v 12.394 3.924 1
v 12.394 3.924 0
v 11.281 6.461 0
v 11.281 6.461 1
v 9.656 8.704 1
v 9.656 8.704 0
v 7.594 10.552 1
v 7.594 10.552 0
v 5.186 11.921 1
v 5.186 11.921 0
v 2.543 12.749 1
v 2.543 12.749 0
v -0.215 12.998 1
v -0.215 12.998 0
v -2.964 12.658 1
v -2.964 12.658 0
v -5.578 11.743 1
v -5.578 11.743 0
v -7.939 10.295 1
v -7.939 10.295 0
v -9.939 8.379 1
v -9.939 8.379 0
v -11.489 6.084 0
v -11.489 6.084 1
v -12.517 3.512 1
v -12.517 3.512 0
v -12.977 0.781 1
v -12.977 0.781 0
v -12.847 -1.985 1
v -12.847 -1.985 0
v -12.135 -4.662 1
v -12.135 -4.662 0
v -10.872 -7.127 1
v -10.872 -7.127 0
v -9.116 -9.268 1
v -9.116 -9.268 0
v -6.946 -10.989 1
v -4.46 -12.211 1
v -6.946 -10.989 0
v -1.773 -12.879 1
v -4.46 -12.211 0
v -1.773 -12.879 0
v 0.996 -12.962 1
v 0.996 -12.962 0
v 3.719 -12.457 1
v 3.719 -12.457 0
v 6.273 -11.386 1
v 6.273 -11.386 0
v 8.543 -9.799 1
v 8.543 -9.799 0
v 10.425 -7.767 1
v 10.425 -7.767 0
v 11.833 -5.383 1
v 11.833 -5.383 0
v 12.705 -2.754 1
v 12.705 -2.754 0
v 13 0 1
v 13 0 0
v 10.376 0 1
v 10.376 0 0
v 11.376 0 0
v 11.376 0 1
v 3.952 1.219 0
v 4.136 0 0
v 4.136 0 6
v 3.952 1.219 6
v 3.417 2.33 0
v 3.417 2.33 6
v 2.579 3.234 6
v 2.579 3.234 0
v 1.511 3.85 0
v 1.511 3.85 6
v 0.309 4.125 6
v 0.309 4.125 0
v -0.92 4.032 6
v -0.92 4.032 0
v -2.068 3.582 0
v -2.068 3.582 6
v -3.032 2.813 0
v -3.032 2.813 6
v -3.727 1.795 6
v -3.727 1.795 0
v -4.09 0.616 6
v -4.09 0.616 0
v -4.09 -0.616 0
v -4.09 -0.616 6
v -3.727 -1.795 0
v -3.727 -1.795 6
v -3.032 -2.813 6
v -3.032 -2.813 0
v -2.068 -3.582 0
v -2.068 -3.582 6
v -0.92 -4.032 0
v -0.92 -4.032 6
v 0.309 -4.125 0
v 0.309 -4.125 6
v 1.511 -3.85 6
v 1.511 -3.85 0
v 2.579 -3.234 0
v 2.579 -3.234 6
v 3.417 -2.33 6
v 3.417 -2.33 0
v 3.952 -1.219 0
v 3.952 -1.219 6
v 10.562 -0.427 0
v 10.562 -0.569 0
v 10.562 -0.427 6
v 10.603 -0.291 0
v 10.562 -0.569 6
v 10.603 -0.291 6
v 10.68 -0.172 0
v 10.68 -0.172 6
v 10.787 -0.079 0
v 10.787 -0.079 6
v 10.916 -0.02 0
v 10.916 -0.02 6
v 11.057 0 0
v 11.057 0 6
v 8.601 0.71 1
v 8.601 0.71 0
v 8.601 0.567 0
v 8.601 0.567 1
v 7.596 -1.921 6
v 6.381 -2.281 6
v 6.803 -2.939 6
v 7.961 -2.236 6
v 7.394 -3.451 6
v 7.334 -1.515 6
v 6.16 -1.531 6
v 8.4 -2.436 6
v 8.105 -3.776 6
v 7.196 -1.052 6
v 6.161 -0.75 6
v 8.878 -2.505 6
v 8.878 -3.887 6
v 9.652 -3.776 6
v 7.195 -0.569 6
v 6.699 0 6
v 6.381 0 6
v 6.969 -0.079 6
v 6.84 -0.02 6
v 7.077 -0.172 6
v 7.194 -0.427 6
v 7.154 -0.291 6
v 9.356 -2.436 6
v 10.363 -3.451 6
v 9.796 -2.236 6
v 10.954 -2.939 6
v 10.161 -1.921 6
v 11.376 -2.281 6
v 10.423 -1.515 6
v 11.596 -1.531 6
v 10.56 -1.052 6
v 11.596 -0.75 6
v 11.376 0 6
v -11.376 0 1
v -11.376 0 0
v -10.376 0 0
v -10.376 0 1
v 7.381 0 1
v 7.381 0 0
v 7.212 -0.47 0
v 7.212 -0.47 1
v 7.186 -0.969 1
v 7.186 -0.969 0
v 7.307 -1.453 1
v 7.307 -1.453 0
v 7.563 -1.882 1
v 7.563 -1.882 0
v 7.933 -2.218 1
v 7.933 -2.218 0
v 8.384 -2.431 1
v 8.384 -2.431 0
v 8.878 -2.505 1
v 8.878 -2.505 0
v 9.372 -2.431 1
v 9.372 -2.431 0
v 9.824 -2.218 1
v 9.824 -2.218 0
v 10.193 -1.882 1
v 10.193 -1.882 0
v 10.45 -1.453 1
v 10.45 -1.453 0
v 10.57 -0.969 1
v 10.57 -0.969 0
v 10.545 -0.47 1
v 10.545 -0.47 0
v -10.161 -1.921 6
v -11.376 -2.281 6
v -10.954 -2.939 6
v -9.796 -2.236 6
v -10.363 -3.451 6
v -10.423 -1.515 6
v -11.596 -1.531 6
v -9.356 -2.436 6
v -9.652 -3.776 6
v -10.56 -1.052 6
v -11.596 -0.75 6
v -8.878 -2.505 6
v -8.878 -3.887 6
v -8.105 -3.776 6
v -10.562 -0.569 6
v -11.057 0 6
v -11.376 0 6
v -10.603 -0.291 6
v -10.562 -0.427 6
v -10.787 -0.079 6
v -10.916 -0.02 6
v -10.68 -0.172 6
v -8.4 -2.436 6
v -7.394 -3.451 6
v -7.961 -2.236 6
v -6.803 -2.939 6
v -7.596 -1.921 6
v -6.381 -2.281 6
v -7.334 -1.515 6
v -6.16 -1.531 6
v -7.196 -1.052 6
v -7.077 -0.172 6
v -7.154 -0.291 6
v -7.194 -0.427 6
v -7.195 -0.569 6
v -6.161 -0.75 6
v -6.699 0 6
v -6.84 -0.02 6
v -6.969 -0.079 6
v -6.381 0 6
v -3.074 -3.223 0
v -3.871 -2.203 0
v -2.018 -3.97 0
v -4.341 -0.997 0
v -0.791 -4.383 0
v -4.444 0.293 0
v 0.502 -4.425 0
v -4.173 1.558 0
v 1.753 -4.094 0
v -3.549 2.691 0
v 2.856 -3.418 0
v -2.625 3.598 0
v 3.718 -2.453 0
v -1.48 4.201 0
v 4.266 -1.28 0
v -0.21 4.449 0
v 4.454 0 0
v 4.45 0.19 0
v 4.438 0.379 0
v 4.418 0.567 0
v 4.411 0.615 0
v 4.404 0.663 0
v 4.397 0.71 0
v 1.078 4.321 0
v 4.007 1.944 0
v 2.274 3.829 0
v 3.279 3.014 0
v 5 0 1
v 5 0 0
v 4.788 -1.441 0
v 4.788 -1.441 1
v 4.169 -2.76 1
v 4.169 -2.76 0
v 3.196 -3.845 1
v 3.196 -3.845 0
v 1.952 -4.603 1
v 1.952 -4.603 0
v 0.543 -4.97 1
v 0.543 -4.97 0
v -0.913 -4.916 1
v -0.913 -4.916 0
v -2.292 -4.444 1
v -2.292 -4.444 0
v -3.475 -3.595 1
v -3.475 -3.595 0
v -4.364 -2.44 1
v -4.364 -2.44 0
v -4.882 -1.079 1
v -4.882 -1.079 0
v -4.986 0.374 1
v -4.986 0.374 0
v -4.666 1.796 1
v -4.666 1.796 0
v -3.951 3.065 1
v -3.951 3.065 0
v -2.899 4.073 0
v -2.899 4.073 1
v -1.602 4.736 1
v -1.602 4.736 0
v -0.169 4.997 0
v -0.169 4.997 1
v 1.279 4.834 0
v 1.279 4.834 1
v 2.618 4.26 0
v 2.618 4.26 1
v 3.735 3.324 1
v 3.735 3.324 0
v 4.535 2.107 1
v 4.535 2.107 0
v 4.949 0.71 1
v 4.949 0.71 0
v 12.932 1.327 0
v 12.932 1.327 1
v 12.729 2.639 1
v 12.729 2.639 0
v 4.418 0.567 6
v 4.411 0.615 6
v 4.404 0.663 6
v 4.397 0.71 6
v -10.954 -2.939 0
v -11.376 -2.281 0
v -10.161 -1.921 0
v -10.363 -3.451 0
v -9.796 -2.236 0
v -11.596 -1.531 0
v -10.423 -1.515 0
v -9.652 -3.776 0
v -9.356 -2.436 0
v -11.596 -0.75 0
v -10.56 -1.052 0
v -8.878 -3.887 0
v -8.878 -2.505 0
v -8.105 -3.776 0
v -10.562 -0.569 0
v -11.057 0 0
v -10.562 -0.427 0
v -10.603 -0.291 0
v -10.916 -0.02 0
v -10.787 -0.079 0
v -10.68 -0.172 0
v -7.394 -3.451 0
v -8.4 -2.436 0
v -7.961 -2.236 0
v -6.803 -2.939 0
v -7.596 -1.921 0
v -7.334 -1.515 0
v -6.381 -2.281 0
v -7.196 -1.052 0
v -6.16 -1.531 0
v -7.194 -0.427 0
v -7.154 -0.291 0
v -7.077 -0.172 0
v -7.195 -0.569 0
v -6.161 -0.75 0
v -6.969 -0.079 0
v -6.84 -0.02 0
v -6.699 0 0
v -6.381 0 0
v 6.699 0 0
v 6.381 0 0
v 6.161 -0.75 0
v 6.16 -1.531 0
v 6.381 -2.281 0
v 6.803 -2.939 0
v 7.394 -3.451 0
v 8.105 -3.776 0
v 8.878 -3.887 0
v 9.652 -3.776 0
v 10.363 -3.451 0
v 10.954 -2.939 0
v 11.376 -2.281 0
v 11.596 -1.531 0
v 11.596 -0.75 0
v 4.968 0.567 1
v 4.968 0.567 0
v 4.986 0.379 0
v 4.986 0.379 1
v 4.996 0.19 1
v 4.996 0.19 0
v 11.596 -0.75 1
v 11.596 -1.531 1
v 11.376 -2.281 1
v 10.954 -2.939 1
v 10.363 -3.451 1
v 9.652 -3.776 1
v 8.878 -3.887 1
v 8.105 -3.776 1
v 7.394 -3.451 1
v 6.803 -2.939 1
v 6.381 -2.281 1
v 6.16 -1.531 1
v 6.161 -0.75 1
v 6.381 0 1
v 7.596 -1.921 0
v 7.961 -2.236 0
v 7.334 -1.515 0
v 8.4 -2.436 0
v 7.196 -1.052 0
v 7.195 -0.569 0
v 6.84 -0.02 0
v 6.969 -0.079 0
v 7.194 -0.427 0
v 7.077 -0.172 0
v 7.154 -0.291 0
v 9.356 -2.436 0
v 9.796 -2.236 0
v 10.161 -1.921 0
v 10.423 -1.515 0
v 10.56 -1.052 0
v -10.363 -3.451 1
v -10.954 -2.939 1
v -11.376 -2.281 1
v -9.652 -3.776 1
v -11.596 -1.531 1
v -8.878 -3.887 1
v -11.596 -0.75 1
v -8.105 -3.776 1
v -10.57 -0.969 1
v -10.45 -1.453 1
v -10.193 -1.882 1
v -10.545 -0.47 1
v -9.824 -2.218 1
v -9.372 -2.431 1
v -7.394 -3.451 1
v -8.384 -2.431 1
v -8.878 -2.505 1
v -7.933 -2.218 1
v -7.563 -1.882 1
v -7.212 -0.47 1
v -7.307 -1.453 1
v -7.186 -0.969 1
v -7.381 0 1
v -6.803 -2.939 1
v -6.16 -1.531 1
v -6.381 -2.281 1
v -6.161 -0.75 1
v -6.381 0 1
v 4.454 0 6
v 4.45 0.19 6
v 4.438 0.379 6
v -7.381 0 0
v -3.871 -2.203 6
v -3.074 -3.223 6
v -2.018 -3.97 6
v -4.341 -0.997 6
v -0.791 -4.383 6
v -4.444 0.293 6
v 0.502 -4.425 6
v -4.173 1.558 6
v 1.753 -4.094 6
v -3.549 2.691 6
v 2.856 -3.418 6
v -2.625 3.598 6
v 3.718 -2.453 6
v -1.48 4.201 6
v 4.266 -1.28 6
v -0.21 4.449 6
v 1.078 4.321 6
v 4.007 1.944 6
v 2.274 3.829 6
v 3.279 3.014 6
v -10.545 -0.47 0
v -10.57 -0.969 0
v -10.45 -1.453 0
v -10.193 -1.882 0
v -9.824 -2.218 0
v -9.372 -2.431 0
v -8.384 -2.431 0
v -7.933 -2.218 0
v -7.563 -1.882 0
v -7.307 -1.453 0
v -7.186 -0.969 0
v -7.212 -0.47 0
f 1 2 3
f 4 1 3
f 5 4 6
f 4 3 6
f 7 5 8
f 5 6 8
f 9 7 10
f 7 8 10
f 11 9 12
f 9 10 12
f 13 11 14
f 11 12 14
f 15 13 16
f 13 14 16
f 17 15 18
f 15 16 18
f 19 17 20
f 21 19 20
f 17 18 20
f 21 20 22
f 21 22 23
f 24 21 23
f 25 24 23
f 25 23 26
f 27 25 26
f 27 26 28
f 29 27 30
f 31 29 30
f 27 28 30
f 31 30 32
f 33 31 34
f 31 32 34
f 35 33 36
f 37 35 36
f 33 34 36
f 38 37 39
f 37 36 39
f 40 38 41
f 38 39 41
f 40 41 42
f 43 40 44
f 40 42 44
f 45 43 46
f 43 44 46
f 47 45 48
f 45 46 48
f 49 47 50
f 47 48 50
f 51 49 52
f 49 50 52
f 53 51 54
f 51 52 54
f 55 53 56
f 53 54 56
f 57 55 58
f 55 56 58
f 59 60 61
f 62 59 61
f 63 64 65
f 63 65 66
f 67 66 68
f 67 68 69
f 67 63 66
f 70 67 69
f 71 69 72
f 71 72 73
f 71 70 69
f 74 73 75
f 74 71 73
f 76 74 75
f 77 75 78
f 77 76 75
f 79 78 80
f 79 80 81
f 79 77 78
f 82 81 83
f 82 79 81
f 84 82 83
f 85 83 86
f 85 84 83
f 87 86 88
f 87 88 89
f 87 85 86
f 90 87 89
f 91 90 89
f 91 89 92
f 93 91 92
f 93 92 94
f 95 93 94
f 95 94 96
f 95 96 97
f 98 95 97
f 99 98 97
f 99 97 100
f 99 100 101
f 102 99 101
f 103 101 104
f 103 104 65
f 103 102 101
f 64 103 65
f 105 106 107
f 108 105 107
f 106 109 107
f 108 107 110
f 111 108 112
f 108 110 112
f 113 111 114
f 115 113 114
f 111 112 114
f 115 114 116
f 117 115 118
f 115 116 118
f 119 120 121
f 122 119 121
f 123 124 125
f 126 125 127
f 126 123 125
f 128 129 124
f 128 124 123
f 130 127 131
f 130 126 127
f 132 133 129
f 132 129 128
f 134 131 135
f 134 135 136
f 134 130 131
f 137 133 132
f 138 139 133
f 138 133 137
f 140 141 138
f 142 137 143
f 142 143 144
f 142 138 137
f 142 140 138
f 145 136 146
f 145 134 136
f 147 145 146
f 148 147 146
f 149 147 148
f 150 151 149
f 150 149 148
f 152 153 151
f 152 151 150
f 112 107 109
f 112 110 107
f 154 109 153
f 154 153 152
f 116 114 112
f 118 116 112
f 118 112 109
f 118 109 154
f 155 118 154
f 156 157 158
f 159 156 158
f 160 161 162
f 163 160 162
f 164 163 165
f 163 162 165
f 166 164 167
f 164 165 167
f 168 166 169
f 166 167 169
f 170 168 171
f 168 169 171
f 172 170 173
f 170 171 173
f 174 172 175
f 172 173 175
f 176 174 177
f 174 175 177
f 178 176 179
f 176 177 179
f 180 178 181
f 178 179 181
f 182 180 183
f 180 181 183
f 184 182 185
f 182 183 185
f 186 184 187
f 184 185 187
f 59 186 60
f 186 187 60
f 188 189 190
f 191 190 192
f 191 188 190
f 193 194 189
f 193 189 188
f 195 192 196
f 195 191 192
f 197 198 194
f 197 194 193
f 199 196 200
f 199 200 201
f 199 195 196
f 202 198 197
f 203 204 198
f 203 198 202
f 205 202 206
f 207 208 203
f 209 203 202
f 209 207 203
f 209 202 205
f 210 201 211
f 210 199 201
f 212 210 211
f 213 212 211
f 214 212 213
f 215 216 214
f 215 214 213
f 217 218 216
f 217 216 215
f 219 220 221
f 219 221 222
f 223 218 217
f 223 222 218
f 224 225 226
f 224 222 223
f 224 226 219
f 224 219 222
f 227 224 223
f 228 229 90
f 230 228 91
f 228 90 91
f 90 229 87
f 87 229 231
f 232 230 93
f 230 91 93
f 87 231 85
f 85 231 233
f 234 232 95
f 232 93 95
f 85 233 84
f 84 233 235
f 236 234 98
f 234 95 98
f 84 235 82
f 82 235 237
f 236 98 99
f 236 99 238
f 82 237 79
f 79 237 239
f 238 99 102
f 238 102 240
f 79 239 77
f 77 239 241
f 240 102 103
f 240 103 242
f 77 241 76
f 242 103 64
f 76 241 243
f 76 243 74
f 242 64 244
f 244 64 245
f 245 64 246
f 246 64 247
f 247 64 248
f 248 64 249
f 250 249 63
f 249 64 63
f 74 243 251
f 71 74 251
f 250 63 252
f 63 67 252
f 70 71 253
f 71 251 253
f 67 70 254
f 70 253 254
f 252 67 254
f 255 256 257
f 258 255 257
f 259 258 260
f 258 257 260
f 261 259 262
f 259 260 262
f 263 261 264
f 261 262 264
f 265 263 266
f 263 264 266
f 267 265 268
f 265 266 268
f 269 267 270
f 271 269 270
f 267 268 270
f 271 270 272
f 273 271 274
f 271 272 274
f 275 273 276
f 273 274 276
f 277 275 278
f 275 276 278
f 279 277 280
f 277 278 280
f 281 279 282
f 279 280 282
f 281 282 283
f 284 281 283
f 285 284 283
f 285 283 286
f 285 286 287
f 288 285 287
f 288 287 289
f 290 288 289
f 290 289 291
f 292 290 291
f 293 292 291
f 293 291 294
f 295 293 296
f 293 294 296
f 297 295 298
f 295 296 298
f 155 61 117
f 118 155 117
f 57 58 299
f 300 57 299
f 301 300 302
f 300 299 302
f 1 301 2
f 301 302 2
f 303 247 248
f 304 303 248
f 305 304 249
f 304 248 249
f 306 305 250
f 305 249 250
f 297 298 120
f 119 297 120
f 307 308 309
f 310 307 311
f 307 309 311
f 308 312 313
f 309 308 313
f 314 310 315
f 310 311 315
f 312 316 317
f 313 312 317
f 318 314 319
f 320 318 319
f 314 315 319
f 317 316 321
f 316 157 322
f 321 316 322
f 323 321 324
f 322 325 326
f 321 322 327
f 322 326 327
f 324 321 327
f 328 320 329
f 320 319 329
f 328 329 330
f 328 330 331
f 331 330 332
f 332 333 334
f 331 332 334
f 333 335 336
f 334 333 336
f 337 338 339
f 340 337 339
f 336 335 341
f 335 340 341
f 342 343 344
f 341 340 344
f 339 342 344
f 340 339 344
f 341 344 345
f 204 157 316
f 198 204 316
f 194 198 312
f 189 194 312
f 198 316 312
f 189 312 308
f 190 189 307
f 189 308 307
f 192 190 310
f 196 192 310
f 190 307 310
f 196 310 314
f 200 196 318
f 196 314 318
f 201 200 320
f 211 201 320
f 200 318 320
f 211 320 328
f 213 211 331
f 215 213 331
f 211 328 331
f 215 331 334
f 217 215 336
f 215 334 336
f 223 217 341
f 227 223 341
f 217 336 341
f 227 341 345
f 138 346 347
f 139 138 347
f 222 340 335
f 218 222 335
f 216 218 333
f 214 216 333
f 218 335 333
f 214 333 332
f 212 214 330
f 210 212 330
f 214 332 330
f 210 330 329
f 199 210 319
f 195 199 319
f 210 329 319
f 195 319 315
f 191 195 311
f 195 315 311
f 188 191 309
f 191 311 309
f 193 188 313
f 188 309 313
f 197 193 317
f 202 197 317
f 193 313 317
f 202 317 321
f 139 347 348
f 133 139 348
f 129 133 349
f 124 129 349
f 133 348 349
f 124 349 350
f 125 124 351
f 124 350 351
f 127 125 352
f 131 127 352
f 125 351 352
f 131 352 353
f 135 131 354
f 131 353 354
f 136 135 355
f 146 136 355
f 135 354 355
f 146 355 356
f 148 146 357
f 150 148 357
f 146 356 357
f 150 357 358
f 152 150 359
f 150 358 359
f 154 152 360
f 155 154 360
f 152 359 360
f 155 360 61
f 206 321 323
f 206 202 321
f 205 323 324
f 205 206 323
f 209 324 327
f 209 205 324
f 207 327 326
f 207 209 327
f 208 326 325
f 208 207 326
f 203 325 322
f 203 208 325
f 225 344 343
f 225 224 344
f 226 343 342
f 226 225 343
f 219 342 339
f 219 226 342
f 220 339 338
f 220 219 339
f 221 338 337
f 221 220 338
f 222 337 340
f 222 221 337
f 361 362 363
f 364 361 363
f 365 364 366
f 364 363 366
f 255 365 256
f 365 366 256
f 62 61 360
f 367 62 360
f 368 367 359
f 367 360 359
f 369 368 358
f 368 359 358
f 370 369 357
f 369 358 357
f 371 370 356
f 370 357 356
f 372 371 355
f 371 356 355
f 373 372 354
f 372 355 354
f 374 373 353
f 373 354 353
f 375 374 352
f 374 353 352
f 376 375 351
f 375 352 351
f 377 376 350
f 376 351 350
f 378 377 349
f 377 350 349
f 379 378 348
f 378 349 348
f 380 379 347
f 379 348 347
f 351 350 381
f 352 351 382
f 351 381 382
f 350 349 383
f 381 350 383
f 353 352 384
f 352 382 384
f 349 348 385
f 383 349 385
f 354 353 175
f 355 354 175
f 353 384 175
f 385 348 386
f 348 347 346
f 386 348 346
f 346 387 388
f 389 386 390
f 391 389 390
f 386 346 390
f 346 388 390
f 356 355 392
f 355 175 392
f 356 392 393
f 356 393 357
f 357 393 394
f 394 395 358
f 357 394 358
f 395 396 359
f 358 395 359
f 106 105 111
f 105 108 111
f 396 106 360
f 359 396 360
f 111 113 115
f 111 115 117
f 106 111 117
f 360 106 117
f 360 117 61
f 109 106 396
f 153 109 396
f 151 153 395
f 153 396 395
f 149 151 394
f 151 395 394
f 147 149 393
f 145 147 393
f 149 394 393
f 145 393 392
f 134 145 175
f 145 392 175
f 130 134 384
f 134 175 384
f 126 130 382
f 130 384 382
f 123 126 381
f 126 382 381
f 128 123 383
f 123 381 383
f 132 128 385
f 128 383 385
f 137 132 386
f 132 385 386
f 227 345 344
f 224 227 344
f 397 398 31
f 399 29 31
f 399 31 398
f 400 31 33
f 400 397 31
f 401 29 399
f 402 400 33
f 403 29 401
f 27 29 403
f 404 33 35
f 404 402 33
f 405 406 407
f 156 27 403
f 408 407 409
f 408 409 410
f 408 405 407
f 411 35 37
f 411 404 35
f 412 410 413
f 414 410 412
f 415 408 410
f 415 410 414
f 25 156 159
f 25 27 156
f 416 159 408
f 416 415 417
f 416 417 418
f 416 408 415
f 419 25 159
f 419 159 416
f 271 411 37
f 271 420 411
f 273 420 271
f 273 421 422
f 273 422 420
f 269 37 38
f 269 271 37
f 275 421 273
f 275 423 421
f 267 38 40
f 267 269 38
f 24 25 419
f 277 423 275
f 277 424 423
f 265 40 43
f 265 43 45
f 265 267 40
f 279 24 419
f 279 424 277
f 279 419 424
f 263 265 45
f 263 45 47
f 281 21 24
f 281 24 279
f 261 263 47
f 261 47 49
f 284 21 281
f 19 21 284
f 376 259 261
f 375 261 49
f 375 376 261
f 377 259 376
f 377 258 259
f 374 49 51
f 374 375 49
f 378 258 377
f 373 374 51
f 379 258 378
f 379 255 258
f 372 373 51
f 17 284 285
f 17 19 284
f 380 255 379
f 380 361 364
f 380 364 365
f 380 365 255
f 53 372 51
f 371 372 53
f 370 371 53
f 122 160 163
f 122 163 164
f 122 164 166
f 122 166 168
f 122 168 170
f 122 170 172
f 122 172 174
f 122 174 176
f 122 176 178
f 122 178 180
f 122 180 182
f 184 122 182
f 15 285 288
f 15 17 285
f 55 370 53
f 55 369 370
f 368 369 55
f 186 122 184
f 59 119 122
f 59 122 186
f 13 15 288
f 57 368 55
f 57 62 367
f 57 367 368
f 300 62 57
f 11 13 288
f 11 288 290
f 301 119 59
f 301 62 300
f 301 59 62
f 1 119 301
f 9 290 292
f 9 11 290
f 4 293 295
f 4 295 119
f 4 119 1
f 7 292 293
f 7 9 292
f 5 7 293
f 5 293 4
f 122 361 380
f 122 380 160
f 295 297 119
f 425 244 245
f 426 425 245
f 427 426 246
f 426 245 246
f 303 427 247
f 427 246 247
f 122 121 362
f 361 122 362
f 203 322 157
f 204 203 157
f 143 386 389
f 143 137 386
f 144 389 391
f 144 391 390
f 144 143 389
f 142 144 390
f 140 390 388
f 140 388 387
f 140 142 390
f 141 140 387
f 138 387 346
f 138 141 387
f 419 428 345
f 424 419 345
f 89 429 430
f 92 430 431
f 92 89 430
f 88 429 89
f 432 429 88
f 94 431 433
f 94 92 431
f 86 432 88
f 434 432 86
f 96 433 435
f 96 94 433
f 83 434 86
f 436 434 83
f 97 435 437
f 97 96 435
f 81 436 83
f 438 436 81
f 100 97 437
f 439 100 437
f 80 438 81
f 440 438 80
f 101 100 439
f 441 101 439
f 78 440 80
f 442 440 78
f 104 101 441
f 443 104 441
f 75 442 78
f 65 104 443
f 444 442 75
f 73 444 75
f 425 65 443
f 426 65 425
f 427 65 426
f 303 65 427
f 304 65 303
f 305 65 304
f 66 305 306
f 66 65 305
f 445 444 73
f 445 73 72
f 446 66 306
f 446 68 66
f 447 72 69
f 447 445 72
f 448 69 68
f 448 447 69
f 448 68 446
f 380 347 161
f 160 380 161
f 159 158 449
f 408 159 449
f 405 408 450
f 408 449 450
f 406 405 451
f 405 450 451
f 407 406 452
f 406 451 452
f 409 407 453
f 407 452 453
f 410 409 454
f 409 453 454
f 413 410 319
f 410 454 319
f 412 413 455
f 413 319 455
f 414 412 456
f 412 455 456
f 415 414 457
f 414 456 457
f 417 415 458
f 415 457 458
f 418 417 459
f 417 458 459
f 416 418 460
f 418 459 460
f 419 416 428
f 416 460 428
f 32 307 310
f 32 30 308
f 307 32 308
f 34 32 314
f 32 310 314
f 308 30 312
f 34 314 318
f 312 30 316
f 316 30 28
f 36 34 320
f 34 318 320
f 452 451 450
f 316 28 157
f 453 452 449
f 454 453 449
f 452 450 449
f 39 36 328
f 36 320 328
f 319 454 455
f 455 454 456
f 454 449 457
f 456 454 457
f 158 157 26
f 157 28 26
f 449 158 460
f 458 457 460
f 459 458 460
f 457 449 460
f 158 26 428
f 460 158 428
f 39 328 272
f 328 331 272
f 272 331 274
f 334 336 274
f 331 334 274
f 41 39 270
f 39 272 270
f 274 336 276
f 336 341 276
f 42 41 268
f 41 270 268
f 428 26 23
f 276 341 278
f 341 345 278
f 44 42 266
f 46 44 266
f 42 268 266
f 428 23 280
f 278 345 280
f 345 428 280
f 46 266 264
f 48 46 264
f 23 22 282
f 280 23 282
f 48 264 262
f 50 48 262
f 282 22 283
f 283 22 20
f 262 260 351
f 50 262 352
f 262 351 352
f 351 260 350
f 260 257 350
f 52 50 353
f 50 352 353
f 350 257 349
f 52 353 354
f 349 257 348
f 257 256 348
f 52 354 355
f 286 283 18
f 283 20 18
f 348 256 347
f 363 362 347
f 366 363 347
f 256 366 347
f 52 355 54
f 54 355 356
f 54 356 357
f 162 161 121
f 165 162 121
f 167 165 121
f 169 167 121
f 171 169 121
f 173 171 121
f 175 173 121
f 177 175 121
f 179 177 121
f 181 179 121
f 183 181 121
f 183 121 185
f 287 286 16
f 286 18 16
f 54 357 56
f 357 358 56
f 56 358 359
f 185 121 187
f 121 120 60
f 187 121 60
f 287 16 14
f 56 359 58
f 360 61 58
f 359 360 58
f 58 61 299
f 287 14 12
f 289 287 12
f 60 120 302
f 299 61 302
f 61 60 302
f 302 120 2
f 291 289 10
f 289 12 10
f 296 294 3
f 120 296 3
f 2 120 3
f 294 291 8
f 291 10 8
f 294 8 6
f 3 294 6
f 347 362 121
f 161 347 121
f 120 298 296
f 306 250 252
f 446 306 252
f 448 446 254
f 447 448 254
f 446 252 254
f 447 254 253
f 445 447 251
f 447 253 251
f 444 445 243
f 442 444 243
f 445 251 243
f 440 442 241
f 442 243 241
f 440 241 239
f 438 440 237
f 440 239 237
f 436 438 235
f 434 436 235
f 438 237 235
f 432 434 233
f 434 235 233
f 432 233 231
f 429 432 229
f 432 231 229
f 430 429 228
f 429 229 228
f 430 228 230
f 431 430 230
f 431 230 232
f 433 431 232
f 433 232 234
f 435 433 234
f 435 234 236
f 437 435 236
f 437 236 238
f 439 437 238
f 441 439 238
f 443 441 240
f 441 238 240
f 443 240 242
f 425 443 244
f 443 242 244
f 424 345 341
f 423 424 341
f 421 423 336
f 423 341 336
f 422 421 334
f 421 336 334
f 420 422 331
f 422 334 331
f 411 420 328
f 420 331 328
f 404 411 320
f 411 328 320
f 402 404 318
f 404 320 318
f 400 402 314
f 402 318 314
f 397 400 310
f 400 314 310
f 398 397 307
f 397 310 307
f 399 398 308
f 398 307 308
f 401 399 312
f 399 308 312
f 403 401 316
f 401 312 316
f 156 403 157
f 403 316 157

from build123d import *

# Parameters (mm, degrees)
F1_DEPTH = 6
F2_DEPTH = 1
F0_R     = 4.136169
F3_DEPTH = 6
F4_R     = 0.5


with BuildPart() as f1:
    # F0 (on Top) → F1 (new body)
    with BuildSketch(Plane.XY):
        with BuildLine():
            Line((-6.380845, 0), (-7.380845, 0))
            ThreePointArc((-7.380845, 0), (-8.87826, -2.504829), (-10.375674, 0))
            Line((-10.375674, 0), (-11.375674, 0))
            ThreePointArc((-11.375674, 0), (-8.87826, -3.886867), (-6.380845, 0))
        make_face()
        with BuildLine():
            ThreePointArc((10.375674, 0), (8.87826, -2.504829), (7.380845, 0))
            Line((7.380845, 0), (6.380845, 0))
            ThreePointArc((6.380845, 0), (8.87826, -3.886867), (11.375674, 0))
            Line((11.375674, 0), (10.375674, 0))
        make_face()
    extrude(amount=F1_DEPTH)

    # F4
    f4_edges = [f1.edges().sort_by_distance(p)[0] for p in [
        (7.380845, 0, 3),
        (10.375674, 0, 3),
        (-7.380845, 0, 3),
        (-10.375674, 0, 3),
    ]]
    fillet(f4_edges, radius=F4_R)


with BuildPart() as f2:
    # F0 (on Top) → F2 (new body)
    with BuildSketch(Plane.XY):
        with BuildLine():
            ThreePointArc((12.39353, 3.924337), (-12.847488, -1.985461), (13, 0))
            ThreePointArc((13, 0), (12.847488, 1.985461), (12.39353, 3.924337))
        make_face()
        with BuildLine():
            ThreePointArc((-10.375674, 0), (-8.87826, -2.504829), (-7.380845, 0))
            Line((-7.380845, 0), (-6.380845, 0))
            ThreePointArc((-6.380845, 0), (-8.87826, -3.886867), (-11.375674, 0))
            Line((-11.375674, 0), (-10.375674, 0))
        make_face(mode=Mode.SUBTRACT)
        with BuildLine():
            Line((6.380845, 0), (7.380845, 0))
            ThreePointArc((7.380845, 0), (8.87826, -2.504829), (10.375674, 0))
            Line((10.375674, 0), (11.375674, 0))
            ThreePointArc((11.375674, 0), (8.87826, -3.886867), (6.380845, 0))
        make_face(mode=Mode.SUBTRACT)
        with BuildLine():
            ThreePointArc((4.967694, 0.567467), (4.991917, 0.284193), (5, 0))
            ThreePointArc((5, 0), (-4.987314, -0.355951), (4.949319, 0.710096))
            Line((4.949319, 0.710096), (8.601126, 0.710096))
            Line((8.601126, 0.710096), (8.601126, 0.567467))
            Line((8.601126, 0.567467), (4.967694, 0.567467))
        make_face(mode=Mode.SUBTRACT)
    extrude(amount=F2_DEPTH)


with BuildPart() as f3:
    # F0 (on Top) → F3 (new body)
    with BuildSketch(Plane.XY):
        with BuildLine():
            ThreePointArc((4.453823, 0), (4.444739, 0.284314), (4.417524, 0.567467))
            ThreePointArc((4.417524, 0.567467), (4.407764, 0.638865), (4.396851, 0.710096))
            ThreePointArc((4.396851, 0.710096), (-4.439557, -0.356189), (4.453823, 0))
        make_face()
        Circle(F0_R, mode=Mode.SUBTRACT)
    extrude(amount=F3_DEPTH)


solid = Compound([f1.part, f2.part, f3.part])
